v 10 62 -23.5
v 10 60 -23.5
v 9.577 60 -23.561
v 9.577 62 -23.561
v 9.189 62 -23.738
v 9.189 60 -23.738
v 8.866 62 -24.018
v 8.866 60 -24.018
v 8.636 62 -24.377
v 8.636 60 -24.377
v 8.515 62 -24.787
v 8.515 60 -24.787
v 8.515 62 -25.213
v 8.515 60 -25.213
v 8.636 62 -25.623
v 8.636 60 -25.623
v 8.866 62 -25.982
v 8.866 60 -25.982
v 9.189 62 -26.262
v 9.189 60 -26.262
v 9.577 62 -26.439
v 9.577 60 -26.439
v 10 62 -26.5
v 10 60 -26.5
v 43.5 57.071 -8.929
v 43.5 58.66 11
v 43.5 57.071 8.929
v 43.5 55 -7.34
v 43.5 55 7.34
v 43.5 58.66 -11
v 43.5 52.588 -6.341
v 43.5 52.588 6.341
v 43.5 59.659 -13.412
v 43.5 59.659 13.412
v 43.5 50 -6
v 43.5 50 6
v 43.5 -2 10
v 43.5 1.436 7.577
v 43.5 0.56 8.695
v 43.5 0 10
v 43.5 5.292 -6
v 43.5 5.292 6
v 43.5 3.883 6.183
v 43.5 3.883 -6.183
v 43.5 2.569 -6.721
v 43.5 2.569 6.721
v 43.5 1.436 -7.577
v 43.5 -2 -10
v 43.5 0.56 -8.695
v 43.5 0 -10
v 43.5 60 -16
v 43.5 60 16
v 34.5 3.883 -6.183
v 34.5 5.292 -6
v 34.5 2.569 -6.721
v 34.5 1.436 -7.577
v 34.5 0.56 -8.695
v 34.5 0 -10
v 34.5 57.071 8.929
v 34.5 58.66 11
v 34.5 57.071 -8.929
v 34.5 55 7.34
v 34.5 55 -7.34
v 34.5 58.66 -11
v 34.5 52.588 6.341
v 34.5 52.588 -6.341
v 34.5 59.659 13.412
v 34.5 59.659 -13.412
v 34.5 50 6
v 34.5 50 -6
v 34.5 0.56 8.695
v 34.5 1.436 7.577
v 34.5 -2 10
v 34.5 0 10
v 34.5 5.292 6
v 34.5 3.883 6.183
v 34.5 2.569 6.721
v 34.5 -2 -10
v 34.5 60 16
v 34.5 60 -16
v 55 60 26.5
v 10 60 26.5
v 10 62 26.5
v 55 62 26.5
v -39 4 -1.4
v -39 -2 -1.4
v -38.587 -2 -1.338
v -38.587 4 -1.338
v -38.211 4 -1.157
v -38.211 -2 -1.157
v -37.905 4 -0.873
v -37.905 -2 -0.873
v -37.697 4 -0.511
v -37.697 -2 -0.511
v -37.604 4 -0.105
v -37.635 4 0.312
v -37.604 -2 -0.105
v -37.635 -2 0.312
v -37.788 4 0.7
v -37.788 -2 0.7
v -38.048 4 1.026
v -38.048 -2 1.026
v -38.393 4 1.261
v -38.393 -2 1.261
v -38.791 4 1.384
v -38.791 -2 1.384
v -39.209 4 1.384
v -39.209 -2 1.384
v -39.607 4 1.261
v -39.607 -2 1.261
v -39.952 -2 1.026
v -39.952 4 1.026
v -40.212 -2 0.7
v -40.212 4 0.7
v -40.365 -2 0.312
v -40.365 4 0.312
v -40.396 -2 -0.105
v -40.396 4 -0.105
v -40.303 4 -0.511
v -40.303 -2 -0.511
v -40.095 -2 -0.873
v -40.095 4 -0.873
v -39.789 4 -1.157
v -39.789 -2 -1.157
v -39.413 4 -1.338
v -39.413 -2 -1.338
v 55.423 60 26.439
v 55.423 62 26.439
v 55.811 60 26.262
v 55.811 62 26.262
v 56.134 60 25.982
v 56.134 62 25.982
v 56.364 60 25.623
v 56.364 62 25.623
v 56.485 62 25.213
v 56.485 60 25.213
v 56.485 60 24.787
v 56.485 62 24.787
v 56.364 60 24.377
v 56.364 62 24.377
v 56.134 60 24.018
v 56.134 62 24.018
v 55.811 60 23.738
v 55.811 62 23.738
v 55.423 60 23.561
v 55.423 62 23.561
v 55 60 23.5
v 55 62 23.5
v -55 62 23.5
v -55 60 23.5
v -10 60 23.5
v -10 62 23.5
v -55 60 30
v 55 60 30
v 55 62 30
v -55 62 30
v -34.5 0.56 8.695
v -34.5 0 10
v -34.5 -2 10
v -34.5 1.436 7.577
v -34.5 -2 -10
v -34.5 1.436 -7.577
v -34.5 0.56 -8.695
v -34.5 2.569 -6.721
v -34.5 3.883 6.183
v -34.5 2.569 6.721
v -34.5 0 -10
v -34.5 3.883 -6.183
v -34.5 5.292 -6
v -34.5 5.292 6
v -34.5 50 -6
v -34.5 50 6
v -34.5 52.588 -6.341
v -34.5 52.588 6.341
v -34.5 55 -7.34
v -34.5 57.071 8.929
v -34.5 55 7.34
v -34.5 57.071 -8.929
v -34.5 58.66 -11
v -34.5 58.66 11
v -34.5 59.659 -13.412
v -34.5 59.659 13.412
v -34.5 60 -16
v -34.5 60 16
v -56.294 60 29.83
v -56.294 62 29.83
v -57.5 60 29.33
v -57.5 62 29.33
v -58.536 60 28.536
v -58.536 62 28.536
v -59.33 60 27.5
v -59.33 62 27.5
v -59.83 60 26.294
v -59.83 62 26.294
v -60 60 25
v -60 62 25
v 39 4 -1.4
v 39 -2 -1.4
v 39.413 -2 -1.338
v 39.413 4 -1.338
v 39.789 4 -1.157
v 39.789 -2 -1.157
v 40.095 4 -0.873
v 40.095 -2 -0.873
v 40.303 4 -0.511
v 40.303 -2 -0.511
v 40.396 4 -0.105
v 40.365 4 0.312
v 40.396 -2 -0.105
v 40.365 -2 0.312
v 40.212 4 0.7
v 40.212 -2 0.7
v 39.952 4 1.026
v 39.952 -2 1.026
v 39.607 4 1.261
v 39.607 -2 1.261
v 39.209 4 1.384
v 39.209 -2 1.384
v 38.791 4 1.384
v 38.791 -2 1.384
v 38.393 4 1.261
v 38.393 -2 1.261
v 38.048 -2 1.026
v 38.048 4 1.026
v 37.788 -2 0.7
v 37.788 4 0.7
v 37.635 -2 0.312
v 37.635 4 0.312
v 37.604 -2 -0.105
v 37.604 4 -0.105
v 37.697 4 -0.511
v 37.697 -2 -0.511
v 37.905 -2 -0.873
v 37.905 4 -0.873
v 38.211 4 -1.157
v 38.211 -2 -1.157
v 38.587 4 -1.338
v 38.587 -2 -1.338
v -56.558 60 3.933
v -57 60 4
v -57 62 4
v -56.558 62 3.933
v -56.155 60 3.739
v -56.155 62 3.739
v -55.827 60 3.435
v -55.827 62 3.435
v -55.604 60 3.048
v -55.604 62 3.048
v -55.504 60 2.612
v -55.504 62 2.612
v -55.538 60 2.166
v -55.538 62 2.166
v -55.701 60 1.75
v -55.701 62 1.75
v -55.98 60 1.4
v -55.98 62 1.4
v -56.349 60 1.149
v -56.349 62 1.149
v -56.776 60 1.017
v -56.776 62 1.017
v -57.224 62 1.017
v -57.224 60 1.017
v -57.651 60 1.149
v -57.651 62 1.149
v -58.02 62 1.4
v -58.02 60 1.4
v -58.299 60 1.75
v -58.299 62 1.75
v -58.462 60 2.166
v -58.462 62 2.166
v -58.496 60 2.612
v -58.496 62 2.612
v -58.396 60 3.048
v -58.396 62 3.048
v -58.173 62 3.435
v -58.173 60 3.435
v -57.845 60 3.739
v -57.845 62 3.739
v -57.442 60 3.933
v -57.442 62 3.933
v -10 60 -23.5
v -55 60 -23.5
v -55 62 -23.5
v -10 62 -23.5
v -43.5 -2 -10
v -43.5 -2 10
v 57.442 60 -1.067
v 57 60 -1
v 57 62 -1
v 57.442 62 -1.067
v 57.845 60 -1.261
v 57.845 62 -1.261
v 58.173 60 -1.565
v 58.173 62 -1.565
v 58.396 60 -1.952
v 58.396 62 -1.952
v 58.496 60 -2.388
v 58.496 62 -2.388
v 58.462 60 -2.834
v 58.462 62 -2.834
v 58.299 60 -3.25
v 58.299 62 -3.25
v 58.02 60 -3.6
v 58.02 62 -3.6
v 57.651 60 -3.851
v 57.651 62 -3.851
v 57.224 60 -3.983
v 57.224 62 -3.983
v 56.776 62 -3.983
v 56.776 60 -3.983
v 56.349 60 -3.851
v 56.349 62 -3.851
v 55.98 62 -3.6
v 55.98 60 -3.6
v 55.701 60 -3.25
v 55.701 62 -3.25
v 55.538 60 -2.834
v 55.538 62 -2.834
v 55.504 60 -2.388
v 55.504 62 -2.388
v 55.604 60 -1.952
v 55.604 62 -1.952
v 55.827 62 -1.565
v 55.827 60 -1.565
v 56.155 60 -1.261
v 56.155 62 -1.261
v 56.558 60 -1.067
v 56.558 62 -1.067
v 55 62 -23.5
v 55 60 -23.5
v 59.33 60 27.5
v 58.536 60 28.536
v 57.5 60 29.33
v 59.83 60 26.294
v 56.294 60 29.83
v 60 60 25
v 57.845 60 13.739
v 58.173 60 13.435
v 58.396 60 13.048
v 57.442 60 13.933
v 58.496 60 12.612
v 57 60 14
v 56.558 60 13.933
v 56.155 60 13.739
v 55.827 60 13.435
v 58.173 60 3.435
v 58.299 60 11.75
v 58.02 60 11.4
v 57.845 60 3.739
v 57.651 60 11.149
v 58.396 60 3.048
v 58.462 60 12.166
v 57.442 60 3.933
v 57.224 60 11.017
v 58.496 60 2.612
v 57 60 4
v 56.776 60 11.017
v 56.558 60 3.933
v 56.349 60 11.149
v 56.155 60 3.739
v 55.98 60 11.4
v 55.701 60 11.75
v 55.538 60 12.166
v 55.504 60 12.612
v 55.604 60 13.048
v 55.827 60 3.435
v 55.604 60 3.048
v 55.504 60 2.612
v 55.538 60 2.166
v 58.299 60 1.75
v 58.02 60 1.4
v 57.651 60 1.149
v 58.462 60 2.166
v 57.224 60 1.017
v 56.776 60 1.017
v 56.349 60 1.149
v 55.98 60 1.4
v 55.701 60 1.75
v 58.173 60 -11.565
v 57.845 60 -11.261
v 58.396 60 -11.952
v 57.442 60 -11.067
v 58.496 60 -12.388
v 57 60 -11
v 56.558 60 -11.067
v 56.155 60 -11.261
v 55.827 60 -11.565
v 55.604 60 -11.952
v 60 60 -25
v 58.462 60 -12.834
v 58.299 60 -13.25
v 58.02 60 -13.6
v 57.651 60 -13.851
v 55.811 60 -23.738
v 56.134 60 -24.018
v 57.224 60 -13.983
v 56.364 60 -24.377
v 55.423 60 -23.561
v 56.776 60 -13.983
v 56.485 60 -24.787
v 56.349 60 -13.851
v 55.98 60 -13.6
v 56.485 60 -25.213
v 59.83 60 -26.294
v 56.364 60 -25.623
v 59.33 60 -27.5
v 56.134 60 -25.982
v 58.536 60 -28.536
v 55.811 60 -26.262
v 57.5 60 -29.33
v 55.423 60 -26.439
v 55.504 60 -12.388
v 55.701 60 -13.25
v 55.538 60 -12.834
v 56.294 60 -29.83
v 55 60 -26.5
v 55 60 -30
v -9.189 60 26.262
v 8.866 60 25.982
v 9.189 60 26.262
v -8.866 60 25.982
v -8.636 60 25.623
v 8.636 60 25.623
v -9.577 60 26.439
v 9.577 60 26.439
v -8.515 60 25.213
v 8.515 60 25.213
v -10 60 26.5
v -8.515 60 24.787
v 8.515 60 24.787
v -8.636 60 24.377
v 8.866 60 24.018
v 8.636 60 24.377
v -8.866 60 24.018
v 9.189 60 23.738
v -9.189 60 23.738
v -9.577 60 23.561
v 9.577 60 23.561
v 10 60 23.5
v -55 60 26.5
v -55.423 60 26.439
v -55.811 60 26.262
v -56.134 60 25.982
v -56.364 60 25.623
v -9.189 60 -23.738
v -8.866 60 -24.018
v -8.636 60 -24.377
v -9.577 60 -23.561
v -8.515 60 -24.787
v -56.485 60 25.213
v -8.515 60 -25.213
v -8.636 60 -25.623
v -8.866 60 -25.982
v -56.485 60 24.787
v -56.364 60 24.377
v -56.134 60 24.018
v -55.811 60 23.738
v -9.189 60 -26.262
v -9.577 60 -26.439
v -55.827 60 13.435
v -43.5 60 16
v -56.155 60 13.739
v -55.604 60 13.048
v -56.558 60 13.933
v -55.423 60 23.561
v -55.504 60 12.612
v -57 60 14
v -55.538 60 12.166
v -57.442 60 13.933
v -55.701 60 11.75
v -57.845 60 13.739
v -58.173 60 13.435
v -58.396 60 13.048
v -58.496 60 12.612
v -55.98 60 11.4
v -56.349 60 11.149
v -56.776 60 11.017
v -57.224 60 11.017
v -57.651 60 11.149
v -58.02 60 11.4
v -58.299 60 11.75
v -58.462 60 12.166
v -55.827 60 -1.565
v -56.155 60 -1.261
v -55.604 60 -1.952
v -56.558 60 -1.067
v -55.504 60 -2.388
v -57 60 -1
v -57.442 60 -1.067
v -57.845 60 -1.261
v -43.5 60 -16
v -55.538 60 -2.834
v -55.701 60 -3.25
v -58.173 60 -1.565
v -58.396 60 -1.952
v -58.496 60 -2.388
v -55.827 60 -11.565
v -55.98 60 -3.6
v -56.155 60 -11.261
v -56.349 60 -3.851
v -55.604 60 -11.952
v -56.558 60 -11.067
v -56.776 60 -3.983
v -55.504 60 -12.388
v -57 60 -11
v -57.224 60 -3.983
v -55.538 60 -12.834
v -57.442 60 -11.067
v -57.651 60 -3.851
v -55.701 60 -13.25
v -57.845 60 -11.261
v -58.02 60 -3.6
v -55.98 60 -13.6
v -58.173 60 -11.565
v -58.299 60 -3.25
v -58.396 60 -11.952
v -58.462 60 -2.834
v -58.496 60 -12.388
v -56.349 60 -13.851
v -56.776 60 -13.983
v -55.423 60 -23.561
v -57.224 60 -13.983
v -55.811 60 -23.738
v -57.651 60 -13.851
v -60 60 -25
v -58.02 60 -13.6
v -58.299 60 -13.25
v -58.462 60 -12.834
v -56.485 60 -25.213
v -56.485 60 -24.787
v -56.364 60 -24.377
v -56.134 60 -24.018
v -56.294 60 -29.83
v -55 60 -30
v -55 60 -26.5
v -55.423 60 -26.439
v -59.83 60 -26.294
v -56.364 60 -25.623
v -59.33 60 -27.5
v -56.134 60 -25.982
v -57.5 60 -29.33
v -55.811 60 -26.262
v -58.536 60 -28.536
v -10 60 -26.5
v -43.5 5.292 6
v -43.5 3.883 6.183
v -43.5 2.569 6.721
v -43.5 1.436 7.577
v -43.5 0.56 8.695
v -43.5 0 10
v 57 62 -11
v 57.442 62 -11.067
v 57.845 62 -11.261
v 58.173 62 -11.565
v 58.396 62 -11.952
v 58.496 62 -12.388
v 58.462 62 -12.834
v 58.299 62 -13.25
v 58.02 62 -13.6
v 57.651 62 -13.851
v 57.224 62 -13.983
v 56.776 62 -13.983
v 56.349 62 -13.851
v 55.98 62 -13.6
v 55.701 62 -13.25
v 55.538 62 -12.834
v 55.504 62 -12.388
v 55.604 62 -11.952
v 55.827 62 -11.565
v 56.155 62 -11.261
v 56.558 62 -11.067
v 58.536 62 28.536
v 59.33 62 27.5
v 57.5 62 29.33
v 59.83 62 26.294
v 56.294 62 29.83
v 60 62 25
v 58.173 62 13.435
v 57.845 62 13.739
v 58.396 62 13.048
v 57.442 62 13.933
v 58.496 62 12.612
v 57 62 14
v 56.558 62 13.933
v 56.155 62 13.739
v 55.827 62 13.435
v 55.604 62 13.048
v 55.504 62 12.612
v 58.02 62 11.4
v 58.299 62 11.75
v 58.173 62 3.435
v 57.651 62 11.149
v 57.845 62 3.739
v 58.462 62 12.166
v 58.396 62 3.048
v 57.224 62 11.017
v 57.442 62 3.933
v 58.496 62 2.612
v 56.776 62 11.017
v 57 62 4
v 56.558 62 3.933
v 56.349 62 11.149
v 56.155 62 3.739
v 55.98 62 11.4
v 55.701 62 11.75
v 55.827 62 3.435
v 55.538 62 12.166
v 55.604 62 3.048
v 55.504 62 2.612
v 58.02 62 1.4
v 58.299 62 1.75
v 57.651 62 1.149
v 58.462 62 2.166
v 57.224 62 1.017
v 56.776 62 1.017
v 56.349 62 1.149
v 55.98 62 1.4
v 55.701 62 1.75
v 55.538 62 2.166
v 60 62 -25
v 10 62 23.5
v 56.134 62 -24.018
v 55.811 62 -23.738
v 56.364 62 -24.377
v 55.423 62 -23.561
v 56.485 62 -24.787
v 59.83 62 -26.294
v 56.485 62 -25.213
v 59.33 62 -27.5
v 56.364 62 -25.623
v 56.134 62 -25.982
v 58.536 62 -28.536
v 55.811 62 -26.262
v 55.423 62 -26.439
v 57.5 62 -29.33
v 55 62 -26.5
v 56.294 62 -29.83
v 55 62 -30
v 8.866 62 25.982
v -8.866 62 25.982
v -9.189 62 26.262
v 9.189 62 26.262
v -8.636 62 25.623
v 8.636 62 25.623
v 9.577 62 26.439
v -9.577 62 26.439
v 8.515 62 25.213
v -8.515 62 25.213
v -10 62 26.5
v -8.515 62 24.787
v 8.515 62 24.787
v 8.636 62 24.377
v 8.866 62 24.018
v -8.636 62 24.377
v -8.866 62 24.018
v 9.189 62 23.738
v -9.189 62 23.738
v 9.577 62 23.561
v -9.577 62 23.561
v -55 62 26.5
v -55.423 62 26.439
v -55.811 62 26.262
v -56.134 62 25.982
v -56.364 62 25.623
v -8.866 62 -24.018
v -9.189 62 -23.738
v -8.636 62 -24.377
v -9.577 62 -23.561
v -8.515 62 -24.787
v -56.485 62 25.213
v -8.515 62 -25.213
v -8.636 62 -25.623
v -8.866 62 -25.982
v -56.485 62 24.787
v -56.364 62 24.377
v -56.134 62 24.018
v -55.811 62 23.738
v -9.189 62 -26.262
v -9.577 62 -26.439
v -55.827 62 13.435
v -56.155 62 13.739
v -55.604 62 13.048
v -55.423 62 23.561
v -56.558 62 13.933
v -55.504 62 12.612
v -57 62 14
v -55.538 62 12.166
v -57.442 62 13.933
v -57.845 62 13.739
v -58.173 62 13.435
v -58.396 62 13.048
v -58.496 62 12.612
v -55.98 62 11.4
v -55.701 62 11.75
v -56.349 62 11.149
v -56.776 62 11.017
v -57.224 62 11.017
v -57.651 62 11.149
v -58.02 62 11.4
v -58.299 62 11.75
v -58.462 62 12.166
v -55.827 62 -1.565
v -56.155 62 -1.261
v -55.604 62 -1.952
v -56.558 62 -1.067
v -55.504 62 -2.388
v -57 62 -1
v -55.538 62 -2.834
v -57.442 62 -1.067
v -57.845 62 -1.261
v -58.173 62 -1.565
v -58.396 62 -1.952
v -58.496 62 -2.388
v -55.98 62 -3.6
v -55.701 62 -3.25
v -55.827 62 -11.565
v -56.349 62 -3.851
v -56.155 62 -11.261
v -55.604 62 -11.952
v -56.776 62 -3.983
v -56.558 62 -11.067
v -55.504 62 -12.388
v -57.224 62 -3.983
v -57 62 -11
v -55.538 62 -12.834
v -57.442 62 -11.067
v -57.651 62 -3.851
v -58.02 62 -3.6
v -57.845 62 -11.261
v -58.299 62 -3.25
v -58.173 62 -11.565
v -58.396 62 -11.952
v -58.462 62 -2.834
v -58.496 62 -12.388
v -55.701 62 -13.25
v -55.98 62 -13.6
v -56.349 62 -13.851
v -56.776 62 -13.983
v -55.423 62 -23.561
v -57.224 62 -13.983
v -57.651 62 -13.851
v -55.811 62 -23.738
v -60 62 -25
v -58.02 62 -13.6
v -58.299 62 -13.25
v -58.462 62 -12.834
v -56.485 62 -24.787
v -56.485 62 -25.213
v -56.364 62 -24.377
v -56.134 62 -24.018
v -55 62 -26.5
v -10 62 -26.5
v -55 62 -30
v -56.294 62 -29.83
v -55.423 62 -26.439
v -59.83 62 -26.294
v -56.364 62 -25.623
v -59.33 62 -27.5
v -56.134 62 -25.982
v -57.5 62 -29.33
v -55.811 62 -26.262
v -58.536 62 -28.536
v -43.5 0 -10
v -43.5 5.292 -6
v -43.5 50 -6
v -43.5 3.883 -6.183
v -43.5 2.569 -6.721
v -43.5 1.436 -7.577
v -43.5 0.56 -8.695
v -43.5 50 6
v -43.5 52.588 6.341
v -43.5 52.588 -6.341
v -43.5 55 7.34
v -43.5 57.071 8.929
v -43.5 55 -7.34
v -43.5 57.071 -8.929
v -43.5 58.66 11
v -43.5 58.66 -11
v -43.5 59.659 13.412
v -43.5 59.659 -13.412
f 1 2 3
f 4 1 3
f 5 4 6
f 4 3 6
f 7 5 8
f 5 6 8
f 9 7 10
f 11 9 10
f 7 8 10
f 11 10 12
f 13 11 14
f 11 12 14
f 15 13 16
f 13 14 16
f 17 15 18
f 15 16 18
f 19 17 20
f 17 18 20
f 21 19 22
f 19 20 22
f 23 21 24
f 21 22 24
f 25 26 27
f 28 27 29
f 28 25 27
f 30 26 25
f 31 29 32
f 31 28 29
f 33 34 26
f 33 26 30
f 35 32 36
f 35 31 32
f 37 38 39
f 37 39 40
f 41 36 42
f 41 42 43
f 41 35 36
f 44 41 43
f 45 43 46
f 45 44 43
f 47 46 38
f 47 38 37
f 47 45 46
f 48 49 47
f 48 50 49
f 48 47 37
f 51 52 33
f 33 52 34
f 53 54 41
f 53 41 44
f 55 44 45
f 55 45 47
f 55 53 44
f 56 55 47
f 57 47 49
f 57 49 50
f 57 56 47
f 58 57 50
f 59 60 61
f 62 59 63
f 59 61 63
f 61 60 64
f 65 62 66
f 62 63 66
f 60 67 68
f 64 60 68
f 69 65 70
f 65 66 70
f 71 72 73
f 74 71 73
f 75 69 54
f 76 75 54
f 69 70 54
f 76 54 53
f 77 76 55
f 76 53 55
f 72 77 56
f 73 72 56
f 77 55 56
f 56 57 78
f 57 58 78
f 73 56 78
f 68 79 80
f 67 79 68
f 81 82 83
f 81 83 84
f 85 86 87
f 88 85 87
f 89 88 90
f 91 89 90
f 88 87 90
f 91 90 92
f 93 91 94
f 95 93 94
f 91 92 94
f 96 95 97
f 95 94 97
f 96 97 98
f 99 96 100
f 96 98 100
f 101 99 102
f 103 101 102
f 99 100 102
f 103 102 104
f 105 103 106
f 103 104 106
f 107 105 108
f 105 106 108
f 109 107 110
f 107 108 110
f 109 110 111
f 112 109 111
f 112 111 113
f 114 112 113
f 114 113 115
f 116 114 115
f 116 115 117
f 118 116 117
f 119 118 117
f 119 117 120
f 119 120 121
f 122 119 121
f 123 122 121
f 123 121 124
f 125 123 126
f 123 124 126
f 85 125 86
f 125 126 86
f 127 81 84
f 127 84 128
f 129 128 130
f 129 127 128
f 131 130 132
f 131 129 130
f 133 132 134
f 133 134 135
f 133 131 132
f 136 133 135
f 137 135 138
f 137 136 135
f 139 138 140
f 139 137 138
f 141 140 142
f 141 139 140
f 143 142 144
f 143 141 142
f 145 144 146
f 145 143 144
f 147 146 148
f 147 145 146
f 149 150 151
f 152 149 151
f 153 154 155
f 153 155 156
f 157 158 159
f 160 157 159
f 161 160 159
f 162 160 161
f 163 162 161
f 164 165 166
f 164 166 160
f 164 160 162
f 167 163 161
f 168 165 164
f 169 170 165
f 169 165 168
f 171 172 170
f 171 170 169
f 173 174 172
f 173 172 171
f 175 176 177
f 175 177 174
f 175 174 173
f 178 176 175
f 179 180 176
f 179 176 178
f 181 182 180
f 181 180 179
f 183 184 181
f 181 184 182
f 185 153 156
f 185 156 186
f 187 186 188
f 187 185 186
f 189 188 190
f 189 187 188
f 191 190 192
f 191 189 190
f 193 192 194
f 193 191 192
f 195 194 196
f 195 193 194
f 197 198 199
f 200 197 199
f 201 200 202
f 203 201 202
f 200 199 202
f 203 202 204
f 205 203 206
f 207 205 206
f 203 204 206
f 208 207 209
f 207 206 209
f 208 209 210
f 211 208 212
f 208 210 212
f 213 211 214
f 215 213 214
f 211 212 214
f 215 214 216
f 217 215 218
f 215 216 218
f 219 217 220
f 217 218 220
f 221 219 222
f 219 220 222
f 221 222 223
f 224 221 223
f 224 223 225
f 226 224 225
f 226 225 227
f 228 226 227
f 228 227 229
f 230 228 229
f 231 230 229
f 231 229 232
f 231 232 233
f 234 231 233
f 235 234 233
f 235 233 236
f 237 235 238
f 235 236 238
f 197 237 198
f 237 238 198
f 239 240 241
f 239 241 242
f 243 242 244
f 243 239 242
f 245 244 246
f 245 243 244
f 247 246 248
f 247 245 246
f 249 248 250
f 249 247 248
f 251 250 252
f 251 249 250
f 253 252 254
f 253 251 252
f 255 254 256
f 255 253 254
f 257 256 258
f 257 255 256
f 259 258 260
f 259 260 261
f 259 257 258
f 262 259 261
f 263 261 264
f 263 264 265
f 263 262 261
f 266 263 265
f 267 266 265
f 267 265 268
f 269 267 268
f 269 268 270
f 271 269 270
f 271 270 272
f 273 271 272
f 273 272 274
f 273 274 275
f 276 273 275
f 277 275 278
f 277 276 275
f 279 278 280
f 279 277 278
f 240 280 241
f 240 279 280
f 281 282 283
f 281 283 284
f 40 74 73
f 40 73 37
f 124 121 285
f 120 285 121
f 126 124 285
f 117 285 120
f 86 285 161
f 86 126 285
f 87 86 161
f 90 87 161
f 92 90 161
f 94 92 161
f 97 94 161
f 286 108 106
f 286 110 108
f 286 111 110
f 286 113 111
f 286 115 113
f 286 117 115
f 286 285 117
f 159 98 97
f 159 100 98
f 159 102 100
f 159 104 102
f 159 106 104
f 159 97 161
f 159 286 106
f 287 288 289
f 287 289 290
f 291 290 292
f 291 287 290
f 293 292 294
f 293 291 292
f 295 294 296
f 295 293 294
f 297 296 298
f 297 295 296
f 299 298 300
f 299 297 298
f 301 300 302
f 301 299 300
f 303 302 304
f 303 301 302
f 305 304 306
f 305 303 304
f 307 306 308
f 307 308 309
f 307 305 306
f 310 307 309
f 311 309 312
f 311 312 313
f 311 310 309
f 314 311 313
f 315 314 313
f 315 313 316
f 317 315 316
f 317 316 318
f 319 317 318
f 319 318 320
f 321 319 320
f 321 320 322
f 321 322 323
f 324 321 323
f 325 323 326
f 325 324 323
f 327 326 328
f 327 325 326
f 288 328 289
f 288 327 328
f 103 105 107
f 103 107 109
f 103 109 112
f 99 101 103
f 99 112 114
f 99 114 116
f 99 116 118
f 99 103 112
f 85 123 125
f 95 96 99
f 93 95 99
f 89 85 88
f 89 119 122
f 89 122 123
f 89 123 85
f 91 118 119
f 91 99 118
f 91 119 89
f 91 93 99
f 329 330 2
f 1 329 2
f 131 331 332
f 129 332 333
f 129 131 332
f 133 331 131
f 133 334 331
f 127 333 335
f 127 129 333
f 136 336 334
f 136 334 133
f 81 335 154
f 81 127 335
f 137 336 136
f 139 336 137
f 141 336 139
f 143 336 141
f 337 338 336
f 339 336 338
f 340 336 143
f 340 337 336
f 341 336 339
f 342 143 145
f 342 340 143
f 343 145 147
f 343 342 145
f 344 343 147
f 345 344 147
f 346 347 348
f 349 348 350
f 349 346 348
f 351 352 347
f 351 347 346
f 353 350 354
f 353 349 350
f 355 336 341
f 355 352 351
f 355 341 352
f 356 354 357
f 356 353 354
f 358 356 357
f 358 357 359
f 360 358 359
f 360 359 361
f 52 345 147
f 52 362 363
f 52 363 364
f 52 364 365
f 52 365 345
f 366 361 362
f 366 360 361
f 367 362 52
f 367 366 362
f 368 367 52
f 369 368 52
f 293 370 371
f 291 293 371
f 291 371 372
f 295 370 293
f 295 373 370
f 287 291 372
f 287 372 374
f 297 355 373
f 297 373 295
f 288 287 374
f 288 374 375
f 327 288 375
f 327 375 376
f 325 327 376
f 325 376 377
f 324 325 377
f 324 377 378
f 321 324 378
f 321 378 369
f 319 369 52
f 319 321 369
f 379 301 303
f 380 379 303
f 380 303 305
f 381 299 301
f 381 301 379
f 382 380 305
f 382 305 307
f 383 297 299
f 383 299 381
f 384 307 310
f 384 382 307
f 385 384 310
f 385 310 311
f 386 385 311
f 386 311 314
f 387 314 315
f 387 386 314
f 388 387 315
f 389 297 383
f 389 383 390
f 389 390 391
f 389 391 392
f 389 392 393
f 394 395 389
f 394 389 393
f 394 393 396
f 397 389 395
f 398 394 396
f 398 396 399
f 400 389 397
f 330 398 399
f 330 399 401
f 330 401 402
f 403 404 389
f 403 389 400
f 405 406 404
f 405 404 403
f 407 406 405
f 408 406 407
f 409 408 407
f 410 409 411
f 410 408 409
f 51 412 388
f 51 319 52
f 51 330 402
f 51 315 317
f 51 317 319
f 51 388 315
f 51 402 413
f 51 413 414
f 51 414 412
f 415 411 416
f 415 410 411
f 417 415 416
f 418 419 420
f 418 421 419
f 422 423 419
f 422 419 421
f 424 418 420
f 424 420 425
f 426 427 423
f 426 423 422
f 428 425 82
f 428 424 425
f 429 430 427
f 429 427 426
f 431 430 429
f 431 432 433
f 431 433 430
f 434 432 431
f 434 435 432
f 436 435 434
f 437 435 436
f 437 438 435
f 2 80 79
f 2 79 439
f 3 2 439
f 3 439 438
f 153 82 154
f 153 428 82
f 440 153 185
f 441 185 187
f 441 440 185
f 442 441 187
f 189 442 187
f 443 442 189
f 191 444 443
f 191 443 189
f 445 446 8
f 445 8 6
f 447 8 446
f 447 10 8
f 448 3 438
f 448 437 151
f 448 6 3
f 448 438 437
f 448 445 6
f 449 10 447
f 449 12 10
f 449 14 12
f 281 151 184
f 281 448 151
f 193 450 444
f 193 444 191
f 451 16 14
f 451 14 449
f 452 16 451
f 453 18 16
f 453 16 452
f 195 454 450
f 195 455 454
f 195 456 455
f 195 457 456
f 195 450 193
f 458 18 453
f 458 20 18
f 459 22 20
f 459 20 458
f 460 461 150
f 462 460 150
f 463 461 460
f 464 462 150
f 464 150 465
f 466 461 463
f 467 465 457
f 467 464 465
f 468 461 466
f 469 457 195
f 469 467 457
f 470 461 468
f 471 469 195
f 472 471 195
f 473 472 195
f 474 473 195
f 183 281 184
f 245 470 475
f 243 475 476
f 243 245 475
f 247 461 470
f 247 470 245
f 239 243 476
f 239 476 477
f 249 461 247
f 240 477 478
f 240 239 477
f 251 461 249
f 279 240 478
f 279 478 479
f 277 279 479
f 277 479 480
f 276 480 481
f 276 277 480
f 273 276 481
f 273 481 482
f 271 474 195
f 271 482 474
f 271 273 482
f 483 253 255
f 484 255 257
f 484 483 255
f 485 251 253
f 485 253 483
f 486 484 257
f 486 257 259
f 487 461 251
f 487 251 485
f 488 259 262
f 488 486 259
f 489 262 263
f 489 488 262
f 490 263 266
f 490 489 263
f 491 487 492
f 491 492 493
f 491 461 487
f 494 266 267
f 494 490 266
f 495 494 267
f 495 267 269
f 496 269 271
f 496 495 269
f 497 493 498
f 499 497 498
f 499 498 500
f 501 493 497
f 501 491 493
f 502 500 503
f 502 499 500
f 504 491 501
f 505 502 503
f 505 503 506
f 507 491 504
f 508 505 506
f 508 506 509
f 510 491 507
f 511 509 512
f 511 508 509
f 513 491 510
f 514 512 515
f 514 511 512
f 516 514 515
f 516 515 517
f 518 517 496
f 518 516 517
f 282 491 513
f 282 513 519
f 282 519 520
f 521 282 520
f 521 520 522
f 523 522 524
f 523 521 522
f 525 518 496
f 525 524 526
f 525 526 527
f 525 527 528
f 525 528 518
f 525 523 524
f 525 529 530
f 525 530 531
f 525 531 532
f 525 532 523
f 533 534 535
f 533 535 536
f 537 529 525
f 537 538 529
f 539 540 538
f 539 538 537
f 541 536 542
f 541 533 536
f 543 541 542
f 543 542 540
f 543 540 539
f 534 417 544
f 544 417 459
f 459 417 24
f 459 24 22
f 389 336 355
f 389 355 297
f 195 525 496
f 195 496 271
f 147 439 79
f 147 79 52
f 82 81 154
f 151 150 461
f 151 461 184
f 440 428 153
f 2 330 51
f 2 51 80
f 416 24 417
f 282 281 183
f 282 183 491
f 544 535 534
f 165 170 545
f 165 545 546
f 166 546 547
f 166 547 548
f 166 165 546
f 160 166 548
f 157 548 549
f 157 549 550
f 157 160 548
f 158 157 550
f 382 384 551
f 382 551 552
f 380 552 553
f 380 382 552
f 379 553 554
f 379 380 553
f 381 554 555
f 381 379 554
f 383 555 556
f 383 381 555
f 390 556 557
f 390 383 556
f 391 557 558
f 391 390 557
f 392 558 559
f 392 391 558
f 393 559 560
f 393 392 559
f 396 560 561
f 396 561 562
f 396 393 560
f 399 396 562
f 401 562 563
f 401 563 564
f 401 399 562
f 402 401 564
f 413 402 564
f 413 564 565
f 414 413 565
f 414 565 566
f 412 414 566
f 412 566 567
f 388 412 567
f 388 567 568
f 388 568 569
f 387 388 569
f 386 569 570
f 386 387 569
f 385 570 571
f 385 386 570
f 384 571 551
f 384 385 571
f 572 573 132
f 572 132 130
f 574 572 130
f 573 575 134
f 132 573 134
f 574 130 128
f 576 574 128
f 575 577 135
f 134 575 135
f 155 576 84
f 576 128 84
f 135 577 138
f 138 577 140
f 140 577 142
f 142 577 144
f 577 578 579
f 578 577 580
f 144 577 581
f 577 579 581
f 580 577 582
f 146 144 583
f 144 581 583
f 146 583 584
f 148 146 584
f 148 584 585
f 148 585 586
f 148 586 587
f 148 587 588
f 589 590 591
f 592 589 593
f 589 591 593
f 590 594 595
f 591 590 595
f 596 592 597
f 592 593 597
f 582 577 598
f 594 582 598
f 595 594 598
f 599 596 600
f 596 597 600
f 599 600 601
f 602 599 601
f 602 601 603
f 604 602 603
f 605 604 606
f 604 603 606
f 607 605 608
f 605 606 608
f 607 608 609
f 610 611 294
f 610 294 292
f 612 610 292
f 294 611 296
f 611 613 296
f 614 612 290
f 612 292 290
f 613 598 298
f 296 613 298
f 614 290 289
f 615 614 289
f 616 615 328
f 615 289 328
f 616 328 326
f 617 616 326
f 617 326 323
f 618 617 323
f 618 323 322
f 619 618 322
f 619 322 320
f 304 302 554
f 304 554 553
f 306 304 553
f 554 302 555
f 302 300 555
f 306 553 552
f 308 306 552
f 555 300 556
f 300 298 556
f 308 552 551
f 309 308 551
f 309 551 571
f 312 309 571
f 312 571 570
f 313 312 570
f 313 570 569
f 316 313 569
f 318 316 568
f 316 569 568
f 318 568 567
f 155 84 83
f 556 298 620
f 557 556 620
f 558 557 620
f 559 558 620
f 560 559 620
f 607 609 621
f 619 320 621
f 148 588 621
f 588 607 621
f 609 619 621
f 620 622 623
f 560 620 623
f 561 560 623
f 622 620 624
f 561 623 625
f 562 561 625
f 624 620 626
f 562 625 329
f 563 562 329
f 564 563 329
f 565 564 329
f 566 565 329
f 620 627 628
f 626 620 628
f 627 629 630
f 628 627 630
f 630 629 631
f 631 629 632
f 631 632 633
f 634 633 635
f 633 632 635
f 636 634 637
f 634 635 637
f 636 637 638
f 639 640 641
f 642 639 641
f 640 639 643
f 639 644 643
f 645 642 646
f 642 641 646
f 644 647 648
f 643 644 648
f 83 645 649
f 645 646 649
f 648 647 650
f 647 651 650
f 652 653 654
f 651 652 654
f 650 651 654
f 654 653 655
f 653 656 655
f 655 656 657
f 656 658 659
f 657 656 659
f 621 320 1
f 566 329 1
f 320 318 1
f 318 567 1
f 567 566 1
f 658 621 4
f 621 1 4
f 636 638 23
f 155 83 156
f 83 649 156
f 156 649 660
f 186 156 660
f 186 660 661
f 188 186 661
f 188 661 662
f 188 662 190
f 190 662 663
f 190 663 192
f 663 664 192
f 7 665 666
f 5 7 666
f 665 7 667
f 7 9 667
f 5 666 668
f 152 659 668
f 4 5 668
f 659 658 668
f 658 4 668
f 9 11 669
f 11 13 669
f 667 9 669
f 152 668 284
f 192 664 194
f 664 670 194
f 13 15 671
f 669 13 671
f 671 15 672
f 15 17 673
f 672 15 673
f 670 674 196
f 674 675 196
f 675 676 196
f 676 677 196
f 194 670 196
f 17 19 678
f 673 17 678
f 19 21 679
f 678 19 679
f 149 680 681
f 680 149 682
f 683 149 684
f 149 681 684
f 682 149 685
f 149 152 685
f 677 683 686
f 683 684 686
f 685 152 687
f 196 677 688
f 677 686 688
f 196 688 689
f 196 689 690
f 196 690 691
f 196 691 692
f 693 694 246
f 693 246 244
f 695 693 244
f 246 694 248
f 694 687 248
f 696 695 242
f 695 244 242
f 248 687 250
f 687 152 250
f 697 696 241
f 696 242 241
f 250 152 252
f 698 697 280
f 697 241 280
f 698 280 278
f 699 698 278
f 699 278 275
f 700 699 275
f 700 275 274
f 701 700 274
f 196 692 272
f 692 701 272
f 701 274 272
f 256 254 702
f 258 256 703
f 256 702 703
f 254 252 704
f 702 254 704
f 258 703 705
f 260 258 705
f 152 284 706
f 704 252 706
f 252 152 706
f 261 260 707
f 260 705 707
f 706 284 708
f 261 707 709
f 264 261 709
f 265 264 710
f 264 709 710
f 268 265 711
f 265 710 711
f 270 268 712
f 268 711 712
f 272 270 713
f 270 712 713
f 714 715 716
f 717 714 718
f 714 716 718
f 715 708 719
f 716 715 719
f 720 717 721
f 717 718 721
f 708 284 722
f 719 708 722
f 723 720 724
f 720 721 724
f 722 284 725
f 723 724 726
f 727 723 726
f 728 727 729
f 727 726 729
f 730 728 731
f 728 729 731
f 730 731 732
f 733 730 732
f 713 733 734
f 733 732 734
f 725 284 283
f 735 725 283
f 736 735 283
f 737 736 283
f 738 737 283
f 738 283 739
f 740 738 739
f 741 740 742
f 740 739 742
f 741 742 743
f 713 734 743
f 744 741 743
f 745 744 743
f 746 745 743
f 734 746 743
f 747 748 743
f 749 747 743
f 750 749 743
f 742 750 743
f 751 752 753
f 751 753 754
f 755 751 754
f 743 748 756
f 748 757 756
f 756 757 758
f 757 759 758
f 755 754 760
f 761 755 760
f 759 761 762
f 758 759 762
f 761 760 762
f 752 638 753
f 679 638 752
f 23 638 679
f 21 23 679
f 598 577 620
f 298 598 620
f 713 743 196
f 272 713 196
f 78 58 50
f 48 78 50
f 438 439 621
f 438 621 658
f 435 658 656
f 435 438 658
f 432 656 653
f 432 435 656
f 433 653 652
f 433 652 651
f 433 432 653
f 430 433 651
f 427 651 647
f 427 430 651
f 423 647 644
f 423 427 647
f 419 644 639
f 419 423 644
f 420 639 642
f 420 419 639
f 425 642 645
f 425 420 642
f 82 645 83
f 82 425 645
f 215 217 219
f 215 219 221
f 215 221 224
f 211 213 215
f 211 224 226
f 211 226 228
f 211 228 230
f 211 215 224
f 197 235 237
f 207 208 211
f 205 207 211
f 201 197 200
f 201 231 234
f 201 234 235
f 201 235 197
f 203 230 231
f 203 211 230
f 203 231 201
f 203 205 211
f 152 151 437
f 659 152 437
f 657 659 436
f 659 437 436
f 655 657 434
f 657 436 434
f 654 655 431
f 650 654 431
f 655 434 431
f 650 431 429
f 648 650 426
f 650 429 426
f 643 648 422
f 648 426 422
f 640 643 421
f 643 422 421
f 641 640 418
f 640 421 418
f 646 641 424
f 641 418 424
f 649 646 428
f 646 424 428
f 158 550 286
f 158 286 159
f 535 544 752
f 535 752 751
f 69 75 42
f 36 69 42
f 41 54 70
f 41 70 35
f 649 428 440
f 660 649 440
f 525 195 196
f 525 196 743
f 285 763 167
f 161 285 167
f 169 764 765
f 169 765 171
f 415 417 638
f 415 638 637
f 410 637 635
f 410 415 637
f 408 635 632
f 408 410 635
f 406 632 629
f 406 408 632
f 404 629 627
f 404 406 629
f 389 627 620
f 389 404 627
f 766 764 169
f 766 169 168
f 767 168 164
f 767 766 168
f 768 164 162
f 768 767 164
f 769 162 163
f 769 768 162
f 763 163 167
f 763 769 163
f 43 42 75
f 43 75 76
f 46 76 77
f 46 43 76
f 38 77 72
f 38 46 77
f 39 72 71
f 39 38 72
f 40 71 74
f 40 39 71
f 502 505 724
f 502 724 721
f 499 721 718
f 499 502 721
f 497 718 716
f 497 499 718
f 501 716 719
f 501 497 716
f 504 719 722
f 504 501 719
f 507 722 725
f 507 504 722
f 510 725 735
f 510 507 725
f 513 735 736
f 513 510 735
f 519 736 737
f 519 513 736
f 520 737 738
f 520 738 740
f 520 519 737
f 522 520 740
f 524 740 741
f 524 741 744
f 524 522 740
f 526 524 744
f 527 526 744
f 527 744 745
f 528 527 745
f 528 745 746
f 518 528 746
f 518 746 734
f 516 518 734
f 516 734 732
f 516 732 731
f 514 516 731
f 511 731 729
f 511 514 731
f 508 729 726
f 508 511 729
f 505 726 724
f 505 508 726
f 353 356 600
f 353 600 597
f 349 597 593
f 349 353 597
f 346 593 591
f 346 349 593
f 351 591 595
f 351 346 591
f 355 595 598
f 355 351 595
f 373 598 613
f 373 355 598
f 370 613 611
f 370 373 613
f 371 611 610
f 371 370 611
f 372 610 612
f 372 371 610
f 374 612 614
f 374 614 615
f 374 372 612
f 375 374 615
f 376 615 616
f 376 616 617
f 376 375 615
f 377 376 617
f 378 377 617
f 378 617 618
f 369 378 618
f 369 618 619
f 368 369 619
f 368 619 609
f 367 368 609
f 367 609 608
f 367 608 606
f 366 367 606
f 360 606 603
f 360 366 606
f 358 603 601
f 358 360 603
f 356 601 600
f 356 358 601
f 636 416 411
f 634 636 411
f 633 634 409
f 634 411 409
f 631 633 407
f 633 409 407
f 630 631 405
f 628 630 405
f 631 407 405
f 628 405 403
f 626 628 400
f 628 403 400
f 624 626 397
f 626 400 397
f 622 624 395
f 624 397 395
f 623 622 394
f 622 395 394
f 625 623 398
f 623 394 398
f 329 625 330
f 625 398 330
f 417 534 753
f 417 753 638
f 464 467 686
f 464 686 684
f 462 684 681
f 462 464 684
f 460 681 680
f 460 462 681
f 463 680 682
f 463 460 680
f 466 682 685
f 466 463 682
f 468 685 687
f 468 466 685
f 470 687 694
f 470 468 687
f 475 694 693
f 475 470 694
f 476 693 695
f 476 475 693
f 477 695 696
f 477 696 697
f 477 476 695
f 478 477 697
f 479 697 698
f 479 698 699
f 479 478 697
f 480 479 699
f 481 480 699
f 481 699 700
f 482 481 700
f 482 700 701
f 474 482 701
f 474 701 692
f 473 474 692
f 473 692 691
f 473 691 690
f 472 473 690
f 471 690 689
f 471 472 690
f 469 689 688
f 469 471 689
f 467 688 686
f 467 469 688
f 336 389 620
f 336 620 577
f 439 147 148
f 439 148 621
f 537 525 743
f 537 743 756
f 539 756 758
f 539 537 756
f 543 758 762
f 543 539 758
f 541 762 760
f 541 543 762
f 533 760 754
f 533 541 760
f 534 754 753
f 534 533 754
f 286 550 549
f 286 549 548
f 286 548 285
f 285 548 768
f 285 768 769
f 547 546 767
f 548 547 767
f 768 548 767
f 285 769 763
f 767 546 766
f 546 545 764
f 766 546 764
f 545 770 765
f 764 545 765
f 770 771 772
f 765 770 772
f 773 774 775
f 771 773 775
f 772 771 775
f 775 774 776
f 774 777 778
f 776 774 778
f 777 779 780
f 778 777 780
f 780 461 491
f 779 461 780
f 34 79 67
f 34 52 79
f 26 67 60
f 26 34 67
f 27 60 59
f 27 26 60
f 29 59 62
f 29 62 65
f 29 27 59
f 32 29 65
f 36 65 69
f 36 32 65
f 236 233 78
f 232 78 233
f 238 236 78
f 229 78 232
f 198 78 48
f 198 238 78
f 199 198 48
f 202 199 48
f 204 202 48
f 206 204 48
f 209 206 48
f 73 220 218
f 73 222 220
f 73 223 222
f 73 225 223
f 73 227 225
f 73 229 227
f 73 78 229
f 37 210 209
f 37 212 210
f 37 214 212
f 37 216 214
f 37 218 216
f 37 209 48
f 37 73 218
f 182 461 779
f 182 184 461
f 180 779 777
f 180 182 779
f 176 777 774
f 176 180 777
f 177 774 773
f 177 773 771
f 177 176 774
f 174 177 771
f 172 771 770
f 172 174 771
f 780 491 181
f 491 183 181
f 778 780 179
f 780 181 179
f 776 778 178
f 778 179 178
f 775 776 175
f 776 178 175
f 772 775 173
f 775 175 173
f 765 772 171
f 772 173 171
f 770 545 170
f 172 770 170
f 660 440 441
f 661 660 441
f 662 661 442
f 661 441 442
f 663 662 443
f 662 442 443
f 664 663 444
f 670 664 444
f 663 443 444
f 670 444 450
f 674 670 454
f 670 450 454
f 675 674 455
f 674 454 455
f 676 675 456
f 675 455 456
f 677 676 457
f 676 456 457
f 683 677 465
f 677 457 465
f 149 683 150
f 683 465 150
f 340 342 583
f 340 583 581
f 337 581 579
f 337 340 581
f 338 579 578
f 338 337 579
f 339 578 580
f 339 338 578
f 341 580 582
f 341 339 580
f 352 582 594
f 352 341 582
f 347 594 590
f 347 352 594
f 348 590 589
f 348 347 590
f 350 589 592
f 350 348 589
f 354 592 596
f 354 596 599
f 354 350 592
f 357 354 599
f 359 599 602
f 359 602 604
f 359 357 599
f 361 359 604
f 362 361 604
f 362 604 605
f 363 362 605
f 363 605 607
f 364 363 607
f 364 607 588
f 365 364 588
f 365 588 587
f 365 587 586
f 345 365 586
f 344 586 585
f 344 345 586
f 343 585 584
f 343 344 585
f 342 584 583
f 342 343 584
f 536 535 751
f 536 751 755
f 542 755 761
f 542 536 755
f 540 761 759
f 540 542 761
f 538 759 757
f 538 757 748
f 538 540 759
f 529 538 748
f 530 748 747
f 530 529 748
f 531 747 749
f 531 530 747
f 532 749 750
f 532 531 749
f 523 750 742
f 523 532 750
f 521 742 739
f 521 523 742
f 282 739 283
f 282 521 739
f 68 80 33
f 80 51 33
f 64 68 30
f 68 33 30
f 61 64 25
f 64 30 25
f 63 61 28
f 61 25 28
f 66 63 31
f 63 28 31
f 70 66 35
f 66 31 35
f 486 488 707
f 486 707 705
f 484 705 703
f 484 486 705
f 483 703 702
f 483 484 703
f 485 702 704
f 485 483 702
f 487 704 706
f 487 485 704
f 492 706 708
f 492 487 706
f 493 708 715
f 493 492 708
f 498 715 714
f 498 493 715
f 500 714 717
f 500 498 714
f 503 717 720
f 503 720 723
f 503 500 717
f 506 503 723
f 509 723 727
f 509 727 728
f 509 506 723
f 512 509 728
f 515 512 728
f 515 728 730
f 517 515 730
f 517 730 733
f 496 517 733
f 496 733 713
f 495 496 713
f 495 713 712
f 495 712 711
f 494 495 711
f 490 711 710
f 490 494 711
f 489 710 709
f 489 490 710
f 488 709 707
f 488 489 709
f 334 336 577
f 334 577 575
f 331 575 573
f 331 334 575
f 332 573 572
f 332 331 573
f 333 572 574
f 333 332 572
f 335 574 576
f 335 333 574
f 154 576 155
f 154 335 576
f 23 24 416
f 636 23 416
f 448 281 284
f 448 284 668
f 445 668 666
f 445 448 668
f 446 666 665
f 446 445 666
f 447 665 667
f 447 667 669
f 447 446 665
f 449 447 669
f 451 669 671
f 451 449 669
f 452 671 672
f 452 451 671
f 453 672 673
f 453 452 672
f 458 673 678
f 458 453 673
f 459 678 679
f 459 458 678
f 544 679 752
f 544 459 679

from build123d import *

# Parameters (mm, degrees)
SKETCH1_W             = 9
SKETCH1_H             = 12
BOSS_EXTRUDE1_DEPTH   = 60
BOSS_EXTRUDE1_2_DEPTH = 60
SKETCH2_W             = 9
SKETCH2_H             = 20
BOSS_EXTRUDE2_DEPTH   = 2
SKETCH3_R             = 1.4
CUT_EXTRUDE1_DEPTH    = 6
FILLET1_R             = 5.5
FILLET2_R             = 5.5
SKETCH4_R             = 1.5
BOSS_EXTRUDE4_DEPTH   = 2
FILLET4_R             = 10


with BuildPart() as part:
    # Sketch1 → Boss-Extrude1 (new body)
    with BuildSketch(Plane(origin=(0, 0, 0), x_dir=(1, 0, 0), z_dir=(0, 1, 0))):
        with Locations((39, 0)):
            Rectangle(SKETCH1_W, SKETCH1_H)
    extrude(amount=BOSS_EXTRUDE1_DEPTH)



with BuildPart() as body_2:
    # Sketch1 → Boss-Extrude1 2 (new body)
    with BuildSketch(Plane(origin=(0, 0, 0), x_dir=(1, 0, 0), z_dir=(0, 1, 0))):
        with Locations((-39, 0)):
            Rectangle(SKETCH1_W, SKETCH1_H)
    extrude(amount=BOSS_EXTRUDE1_2_DEPTH)


with BuildPart() as part_1:
    add(part.part)

    add(body_2.part)  # Boss-Extrude2 merges body 2
    # Sketch2 → Boss-Extrude2 (add)
    with BuildSketch(Plane.XZ):
        with Locations((-39, 0)):
            Rectangle(SKETCH2_W, SKETCH2_H)
        with Locations((39, 0)):
            Rectangle(SKETCH2_W, SKETCH2_H)
    extrude(amount=BOSS_EXTRUDE2_DEPTH)

    # Sketch3 → Cut-Extrude1 (cut)
    with BuildSketch(Plane.XZ.offset(2)):
        with Locations(Location((39, 0, 0), (0, 0, 270))):
            Circle(SKETCH3_R)
        with Locations(Location((-39, 0, 0), (0, 0, 270))):
            Circle(SKETCH3_R)
    extrude(amount=-CUT_EXTRUDE1_DEPTH, mode=Mode.SUBTRACT)

    # Fillet1
    # the kernel refuses this fillet: 5.5 mm, written as the material it adds along each edge
    with BuildSketch(Plane(origin=(-43.5, 0, -6), x_dir=(0, 1, 0), z_dir=(1, 0, 0))) as fillet1_piece_1:
        with BuildLine():
            CenterArc((5.291502622, -5.5), FILLET1_R, 90, 74.173379868)
            Line((0, -4), (-0.105830052, -3.97))
            ThreePointArc((-0.105830052, -3.97), (-0.11, -2), (-0.11, 0))
            Line((-0.11, 0), (0, 0.11))
            Line((0, 0.11), (5.291502622, 0.11))
            Line((5.291502622, 0.11), (5.291502622, 0))
        make_face()
    extrude(amount=9)
    with BuildSketch(Plane(origin=(-34.5, 0, 6), x_dir=(0, 0, 1), z_dir=(-1, 0, 0))) as fillet1_piece_2:
        with BuildLine():
            CenterArc((5.5, 5.291502622), FILLET1_R, 180, 74.173379868)
            Line((0, 5.291502622), (-0.11, 5.291502622))
            Line((-0.11, 5.291502622), (-0.11, 0))
            Line((-0.11, 0), (0, -0.11))
            ThreePointArc((0, -0.11), (2, -0.11), (3.97, -0.105830052))
            Line((3.97, -0.105830052), (4, 0))
        make_face()
    extrude(amount=9)

    # Fillet2
    # the kernel refuses this fillet: 5.5 mm, written as the material it adds along each edge
    with BuildSketch(Plane(origin=(34.5, 0, -6), x_dir=(0, 0, -1), z_dir=(1, 0, 0))) as fillet2_piece_1:
        with BuildLine():
            CenterArc((5.5, 5.291502622), FILLET2_R, 180, 74.173379868)
            Line((0, 5.291502622), (-0.11, 5.291502622))
            Line((-0.11, 5.291502622), (-0.11, 0))
            Line((-0.11, 0), (0, -0.11))
            ThreePointArc((0, -0.11), (2, -0.11), (3.97, -0.105830052))
            Line((3.97, -0.105830052), (4, 0))
        make_face()
    extrude(amount=9)
    with BuildSketch(Plane(origin=(43.5, 0, 6), x_dir=(0, 1, 0), z_dir=(-1, 0, 0))) as fillet2_piece_2:
        with BuildLine():
            CenterArc((5.291502622, -5.5), FILLET2_R, 90, 74.173379868)
            Line((0, -4), (-0.105830052, -3.97))
            ThreePointArc((-0.105830052, -3.97), (-0.11, -2), (-0.11, 0))
            Line((-0.11, 0), (0, 0.11))
            Line((0, 0.11), (5.291502622, 0.11))
            Line((5.291502622, 0.11), (5.291502622, 0))
        make_face()
    extrude(amount=9)

    # Sketch4 → Boss-Extrude4 (add)
    with BuildSketch(Plane(origin=(0, 60, 0), x_dir=(1, 0, 0), z_dir=(0, 1, 0))):
        with BuildLine():
            Line((-55, 30), (55, 30))
            ThreePointArc((55, 30), (58.535533906, 28.535533906), (60, 25))
            Line((60, 25), (60, -25))
            ThreePointArc((60, -25), (58.535533906, -28.535533906), (55, -30))
            Line((55, -30), (-55, -30))
            ThreePointArc((-55, -30), (-58.535533906, -28.535533906), (-60, -25))
            Line((-60, -25), (-60, 25))
            ThreePointArc((-60, 25), (-58.535533906, 28.535533906), (-55, 30))
        make_face()
        with Locations(Location((-57, -2.5, 0), (0, 0, 270))):
            Circle(SKETCH4_R, mode=Mode.SUBTRACT)
        with Locations(Location((-57, -12.5, 0), (0, 0, 270))):
            Circle(SKETCH4_R, mode=Mode.SUBTRACT)
        with Locations(Location((57, -12.5, 0), (0, 0, 270))):
            Circle(SKETCH4_R, mode=Mode.SUBTRACT)
        with Locations(Location((57, -2.5, 0), (0, 0, 270))):
            Circle(SKETCH4_R, mode=Mode.SUBTRACT)
        with Locations(Location((57, 2.5, 0), (0, 0, 270))):
            Circle(SKETCH4_R, mode=Mode.SUBTRACT)
        with Locations(Location((57, 12.5, 0), (0, 0, 270))):
            Circle(SKETCH4_R, mode=Mode.SUBTRACT)
        with Locations(Location((-57, 12.5, 0), (0, 0, 270))):
            Circle(SKETCH4_R, mode=Mode.SUBTRACT)
        with Locations(Location((-57, 2.5, 0), (0, 0, 270))):
            Circle(SKETCH4_R, mode=Mode.SUBTRACT)
        with BuildLine():
            Line((55, 23.5), (10, 23.5))
            ThreePointArc((10, 23.5), (8.5, 25), (10, 26.5))
            Line((10, 26.5), (55, 26.5))
            ThreePointArc((55, 26.5), (56.5, 25), (55, 23.5))
        make_face(mode=Mode.SUBTRACT)
        with BuildLine():
            Line((-55, -23.5), (-10, -23.5))
            ThreePointArc((-10, -23.5), (-8.5, -25), (-10, -26.5))
            Line((-10, -26.5), (-55, -26.5))
            ThreePointArc((-55, -26.5), (-56.5, -25), (-55, -23.5))
        make_face(mode=Mode.SUBTRACT)
        with BuildLine():
            Line((-55, 23.5), (-10, 23.5))
            ThreePointArc((-10, 23.5), (-8.5, 25), (-10, 26.5))
            Line((-10, 26.5), (-55, 26.5))
            ThreePointArc((-55, 26.5), (-56.5, 25), (-55, 23.5))
        make_face(mode=Mode.SUBTRACT)
        with BuildLine():
            Line((55, -23.5), (10, -23.5))
            ThreePointArc((10, -23.5), (8.5, -25), (10, -26.5))
            Line((10, -26.5), (55, -26.5))
            ThreePointArc((55, -26.5), (56.5, -25), (55, -23.5))
        make_face(mode=Mode.SUBTRACT)
    extrude(amount=BOSS_EXTRUDE4_DEPTH)

    # Fillet4
    fillet4_edges = [part_1.edges().sort_by_distance(p)[0] for p in [
        (39, 60, 6),
        (39, 60, -6),
        (-39, 60, -6),
        (-39, 60, 6),
    ]]
    fillet(fillet4_edges, radius=FILLET4_R)


solid = part_1.part
